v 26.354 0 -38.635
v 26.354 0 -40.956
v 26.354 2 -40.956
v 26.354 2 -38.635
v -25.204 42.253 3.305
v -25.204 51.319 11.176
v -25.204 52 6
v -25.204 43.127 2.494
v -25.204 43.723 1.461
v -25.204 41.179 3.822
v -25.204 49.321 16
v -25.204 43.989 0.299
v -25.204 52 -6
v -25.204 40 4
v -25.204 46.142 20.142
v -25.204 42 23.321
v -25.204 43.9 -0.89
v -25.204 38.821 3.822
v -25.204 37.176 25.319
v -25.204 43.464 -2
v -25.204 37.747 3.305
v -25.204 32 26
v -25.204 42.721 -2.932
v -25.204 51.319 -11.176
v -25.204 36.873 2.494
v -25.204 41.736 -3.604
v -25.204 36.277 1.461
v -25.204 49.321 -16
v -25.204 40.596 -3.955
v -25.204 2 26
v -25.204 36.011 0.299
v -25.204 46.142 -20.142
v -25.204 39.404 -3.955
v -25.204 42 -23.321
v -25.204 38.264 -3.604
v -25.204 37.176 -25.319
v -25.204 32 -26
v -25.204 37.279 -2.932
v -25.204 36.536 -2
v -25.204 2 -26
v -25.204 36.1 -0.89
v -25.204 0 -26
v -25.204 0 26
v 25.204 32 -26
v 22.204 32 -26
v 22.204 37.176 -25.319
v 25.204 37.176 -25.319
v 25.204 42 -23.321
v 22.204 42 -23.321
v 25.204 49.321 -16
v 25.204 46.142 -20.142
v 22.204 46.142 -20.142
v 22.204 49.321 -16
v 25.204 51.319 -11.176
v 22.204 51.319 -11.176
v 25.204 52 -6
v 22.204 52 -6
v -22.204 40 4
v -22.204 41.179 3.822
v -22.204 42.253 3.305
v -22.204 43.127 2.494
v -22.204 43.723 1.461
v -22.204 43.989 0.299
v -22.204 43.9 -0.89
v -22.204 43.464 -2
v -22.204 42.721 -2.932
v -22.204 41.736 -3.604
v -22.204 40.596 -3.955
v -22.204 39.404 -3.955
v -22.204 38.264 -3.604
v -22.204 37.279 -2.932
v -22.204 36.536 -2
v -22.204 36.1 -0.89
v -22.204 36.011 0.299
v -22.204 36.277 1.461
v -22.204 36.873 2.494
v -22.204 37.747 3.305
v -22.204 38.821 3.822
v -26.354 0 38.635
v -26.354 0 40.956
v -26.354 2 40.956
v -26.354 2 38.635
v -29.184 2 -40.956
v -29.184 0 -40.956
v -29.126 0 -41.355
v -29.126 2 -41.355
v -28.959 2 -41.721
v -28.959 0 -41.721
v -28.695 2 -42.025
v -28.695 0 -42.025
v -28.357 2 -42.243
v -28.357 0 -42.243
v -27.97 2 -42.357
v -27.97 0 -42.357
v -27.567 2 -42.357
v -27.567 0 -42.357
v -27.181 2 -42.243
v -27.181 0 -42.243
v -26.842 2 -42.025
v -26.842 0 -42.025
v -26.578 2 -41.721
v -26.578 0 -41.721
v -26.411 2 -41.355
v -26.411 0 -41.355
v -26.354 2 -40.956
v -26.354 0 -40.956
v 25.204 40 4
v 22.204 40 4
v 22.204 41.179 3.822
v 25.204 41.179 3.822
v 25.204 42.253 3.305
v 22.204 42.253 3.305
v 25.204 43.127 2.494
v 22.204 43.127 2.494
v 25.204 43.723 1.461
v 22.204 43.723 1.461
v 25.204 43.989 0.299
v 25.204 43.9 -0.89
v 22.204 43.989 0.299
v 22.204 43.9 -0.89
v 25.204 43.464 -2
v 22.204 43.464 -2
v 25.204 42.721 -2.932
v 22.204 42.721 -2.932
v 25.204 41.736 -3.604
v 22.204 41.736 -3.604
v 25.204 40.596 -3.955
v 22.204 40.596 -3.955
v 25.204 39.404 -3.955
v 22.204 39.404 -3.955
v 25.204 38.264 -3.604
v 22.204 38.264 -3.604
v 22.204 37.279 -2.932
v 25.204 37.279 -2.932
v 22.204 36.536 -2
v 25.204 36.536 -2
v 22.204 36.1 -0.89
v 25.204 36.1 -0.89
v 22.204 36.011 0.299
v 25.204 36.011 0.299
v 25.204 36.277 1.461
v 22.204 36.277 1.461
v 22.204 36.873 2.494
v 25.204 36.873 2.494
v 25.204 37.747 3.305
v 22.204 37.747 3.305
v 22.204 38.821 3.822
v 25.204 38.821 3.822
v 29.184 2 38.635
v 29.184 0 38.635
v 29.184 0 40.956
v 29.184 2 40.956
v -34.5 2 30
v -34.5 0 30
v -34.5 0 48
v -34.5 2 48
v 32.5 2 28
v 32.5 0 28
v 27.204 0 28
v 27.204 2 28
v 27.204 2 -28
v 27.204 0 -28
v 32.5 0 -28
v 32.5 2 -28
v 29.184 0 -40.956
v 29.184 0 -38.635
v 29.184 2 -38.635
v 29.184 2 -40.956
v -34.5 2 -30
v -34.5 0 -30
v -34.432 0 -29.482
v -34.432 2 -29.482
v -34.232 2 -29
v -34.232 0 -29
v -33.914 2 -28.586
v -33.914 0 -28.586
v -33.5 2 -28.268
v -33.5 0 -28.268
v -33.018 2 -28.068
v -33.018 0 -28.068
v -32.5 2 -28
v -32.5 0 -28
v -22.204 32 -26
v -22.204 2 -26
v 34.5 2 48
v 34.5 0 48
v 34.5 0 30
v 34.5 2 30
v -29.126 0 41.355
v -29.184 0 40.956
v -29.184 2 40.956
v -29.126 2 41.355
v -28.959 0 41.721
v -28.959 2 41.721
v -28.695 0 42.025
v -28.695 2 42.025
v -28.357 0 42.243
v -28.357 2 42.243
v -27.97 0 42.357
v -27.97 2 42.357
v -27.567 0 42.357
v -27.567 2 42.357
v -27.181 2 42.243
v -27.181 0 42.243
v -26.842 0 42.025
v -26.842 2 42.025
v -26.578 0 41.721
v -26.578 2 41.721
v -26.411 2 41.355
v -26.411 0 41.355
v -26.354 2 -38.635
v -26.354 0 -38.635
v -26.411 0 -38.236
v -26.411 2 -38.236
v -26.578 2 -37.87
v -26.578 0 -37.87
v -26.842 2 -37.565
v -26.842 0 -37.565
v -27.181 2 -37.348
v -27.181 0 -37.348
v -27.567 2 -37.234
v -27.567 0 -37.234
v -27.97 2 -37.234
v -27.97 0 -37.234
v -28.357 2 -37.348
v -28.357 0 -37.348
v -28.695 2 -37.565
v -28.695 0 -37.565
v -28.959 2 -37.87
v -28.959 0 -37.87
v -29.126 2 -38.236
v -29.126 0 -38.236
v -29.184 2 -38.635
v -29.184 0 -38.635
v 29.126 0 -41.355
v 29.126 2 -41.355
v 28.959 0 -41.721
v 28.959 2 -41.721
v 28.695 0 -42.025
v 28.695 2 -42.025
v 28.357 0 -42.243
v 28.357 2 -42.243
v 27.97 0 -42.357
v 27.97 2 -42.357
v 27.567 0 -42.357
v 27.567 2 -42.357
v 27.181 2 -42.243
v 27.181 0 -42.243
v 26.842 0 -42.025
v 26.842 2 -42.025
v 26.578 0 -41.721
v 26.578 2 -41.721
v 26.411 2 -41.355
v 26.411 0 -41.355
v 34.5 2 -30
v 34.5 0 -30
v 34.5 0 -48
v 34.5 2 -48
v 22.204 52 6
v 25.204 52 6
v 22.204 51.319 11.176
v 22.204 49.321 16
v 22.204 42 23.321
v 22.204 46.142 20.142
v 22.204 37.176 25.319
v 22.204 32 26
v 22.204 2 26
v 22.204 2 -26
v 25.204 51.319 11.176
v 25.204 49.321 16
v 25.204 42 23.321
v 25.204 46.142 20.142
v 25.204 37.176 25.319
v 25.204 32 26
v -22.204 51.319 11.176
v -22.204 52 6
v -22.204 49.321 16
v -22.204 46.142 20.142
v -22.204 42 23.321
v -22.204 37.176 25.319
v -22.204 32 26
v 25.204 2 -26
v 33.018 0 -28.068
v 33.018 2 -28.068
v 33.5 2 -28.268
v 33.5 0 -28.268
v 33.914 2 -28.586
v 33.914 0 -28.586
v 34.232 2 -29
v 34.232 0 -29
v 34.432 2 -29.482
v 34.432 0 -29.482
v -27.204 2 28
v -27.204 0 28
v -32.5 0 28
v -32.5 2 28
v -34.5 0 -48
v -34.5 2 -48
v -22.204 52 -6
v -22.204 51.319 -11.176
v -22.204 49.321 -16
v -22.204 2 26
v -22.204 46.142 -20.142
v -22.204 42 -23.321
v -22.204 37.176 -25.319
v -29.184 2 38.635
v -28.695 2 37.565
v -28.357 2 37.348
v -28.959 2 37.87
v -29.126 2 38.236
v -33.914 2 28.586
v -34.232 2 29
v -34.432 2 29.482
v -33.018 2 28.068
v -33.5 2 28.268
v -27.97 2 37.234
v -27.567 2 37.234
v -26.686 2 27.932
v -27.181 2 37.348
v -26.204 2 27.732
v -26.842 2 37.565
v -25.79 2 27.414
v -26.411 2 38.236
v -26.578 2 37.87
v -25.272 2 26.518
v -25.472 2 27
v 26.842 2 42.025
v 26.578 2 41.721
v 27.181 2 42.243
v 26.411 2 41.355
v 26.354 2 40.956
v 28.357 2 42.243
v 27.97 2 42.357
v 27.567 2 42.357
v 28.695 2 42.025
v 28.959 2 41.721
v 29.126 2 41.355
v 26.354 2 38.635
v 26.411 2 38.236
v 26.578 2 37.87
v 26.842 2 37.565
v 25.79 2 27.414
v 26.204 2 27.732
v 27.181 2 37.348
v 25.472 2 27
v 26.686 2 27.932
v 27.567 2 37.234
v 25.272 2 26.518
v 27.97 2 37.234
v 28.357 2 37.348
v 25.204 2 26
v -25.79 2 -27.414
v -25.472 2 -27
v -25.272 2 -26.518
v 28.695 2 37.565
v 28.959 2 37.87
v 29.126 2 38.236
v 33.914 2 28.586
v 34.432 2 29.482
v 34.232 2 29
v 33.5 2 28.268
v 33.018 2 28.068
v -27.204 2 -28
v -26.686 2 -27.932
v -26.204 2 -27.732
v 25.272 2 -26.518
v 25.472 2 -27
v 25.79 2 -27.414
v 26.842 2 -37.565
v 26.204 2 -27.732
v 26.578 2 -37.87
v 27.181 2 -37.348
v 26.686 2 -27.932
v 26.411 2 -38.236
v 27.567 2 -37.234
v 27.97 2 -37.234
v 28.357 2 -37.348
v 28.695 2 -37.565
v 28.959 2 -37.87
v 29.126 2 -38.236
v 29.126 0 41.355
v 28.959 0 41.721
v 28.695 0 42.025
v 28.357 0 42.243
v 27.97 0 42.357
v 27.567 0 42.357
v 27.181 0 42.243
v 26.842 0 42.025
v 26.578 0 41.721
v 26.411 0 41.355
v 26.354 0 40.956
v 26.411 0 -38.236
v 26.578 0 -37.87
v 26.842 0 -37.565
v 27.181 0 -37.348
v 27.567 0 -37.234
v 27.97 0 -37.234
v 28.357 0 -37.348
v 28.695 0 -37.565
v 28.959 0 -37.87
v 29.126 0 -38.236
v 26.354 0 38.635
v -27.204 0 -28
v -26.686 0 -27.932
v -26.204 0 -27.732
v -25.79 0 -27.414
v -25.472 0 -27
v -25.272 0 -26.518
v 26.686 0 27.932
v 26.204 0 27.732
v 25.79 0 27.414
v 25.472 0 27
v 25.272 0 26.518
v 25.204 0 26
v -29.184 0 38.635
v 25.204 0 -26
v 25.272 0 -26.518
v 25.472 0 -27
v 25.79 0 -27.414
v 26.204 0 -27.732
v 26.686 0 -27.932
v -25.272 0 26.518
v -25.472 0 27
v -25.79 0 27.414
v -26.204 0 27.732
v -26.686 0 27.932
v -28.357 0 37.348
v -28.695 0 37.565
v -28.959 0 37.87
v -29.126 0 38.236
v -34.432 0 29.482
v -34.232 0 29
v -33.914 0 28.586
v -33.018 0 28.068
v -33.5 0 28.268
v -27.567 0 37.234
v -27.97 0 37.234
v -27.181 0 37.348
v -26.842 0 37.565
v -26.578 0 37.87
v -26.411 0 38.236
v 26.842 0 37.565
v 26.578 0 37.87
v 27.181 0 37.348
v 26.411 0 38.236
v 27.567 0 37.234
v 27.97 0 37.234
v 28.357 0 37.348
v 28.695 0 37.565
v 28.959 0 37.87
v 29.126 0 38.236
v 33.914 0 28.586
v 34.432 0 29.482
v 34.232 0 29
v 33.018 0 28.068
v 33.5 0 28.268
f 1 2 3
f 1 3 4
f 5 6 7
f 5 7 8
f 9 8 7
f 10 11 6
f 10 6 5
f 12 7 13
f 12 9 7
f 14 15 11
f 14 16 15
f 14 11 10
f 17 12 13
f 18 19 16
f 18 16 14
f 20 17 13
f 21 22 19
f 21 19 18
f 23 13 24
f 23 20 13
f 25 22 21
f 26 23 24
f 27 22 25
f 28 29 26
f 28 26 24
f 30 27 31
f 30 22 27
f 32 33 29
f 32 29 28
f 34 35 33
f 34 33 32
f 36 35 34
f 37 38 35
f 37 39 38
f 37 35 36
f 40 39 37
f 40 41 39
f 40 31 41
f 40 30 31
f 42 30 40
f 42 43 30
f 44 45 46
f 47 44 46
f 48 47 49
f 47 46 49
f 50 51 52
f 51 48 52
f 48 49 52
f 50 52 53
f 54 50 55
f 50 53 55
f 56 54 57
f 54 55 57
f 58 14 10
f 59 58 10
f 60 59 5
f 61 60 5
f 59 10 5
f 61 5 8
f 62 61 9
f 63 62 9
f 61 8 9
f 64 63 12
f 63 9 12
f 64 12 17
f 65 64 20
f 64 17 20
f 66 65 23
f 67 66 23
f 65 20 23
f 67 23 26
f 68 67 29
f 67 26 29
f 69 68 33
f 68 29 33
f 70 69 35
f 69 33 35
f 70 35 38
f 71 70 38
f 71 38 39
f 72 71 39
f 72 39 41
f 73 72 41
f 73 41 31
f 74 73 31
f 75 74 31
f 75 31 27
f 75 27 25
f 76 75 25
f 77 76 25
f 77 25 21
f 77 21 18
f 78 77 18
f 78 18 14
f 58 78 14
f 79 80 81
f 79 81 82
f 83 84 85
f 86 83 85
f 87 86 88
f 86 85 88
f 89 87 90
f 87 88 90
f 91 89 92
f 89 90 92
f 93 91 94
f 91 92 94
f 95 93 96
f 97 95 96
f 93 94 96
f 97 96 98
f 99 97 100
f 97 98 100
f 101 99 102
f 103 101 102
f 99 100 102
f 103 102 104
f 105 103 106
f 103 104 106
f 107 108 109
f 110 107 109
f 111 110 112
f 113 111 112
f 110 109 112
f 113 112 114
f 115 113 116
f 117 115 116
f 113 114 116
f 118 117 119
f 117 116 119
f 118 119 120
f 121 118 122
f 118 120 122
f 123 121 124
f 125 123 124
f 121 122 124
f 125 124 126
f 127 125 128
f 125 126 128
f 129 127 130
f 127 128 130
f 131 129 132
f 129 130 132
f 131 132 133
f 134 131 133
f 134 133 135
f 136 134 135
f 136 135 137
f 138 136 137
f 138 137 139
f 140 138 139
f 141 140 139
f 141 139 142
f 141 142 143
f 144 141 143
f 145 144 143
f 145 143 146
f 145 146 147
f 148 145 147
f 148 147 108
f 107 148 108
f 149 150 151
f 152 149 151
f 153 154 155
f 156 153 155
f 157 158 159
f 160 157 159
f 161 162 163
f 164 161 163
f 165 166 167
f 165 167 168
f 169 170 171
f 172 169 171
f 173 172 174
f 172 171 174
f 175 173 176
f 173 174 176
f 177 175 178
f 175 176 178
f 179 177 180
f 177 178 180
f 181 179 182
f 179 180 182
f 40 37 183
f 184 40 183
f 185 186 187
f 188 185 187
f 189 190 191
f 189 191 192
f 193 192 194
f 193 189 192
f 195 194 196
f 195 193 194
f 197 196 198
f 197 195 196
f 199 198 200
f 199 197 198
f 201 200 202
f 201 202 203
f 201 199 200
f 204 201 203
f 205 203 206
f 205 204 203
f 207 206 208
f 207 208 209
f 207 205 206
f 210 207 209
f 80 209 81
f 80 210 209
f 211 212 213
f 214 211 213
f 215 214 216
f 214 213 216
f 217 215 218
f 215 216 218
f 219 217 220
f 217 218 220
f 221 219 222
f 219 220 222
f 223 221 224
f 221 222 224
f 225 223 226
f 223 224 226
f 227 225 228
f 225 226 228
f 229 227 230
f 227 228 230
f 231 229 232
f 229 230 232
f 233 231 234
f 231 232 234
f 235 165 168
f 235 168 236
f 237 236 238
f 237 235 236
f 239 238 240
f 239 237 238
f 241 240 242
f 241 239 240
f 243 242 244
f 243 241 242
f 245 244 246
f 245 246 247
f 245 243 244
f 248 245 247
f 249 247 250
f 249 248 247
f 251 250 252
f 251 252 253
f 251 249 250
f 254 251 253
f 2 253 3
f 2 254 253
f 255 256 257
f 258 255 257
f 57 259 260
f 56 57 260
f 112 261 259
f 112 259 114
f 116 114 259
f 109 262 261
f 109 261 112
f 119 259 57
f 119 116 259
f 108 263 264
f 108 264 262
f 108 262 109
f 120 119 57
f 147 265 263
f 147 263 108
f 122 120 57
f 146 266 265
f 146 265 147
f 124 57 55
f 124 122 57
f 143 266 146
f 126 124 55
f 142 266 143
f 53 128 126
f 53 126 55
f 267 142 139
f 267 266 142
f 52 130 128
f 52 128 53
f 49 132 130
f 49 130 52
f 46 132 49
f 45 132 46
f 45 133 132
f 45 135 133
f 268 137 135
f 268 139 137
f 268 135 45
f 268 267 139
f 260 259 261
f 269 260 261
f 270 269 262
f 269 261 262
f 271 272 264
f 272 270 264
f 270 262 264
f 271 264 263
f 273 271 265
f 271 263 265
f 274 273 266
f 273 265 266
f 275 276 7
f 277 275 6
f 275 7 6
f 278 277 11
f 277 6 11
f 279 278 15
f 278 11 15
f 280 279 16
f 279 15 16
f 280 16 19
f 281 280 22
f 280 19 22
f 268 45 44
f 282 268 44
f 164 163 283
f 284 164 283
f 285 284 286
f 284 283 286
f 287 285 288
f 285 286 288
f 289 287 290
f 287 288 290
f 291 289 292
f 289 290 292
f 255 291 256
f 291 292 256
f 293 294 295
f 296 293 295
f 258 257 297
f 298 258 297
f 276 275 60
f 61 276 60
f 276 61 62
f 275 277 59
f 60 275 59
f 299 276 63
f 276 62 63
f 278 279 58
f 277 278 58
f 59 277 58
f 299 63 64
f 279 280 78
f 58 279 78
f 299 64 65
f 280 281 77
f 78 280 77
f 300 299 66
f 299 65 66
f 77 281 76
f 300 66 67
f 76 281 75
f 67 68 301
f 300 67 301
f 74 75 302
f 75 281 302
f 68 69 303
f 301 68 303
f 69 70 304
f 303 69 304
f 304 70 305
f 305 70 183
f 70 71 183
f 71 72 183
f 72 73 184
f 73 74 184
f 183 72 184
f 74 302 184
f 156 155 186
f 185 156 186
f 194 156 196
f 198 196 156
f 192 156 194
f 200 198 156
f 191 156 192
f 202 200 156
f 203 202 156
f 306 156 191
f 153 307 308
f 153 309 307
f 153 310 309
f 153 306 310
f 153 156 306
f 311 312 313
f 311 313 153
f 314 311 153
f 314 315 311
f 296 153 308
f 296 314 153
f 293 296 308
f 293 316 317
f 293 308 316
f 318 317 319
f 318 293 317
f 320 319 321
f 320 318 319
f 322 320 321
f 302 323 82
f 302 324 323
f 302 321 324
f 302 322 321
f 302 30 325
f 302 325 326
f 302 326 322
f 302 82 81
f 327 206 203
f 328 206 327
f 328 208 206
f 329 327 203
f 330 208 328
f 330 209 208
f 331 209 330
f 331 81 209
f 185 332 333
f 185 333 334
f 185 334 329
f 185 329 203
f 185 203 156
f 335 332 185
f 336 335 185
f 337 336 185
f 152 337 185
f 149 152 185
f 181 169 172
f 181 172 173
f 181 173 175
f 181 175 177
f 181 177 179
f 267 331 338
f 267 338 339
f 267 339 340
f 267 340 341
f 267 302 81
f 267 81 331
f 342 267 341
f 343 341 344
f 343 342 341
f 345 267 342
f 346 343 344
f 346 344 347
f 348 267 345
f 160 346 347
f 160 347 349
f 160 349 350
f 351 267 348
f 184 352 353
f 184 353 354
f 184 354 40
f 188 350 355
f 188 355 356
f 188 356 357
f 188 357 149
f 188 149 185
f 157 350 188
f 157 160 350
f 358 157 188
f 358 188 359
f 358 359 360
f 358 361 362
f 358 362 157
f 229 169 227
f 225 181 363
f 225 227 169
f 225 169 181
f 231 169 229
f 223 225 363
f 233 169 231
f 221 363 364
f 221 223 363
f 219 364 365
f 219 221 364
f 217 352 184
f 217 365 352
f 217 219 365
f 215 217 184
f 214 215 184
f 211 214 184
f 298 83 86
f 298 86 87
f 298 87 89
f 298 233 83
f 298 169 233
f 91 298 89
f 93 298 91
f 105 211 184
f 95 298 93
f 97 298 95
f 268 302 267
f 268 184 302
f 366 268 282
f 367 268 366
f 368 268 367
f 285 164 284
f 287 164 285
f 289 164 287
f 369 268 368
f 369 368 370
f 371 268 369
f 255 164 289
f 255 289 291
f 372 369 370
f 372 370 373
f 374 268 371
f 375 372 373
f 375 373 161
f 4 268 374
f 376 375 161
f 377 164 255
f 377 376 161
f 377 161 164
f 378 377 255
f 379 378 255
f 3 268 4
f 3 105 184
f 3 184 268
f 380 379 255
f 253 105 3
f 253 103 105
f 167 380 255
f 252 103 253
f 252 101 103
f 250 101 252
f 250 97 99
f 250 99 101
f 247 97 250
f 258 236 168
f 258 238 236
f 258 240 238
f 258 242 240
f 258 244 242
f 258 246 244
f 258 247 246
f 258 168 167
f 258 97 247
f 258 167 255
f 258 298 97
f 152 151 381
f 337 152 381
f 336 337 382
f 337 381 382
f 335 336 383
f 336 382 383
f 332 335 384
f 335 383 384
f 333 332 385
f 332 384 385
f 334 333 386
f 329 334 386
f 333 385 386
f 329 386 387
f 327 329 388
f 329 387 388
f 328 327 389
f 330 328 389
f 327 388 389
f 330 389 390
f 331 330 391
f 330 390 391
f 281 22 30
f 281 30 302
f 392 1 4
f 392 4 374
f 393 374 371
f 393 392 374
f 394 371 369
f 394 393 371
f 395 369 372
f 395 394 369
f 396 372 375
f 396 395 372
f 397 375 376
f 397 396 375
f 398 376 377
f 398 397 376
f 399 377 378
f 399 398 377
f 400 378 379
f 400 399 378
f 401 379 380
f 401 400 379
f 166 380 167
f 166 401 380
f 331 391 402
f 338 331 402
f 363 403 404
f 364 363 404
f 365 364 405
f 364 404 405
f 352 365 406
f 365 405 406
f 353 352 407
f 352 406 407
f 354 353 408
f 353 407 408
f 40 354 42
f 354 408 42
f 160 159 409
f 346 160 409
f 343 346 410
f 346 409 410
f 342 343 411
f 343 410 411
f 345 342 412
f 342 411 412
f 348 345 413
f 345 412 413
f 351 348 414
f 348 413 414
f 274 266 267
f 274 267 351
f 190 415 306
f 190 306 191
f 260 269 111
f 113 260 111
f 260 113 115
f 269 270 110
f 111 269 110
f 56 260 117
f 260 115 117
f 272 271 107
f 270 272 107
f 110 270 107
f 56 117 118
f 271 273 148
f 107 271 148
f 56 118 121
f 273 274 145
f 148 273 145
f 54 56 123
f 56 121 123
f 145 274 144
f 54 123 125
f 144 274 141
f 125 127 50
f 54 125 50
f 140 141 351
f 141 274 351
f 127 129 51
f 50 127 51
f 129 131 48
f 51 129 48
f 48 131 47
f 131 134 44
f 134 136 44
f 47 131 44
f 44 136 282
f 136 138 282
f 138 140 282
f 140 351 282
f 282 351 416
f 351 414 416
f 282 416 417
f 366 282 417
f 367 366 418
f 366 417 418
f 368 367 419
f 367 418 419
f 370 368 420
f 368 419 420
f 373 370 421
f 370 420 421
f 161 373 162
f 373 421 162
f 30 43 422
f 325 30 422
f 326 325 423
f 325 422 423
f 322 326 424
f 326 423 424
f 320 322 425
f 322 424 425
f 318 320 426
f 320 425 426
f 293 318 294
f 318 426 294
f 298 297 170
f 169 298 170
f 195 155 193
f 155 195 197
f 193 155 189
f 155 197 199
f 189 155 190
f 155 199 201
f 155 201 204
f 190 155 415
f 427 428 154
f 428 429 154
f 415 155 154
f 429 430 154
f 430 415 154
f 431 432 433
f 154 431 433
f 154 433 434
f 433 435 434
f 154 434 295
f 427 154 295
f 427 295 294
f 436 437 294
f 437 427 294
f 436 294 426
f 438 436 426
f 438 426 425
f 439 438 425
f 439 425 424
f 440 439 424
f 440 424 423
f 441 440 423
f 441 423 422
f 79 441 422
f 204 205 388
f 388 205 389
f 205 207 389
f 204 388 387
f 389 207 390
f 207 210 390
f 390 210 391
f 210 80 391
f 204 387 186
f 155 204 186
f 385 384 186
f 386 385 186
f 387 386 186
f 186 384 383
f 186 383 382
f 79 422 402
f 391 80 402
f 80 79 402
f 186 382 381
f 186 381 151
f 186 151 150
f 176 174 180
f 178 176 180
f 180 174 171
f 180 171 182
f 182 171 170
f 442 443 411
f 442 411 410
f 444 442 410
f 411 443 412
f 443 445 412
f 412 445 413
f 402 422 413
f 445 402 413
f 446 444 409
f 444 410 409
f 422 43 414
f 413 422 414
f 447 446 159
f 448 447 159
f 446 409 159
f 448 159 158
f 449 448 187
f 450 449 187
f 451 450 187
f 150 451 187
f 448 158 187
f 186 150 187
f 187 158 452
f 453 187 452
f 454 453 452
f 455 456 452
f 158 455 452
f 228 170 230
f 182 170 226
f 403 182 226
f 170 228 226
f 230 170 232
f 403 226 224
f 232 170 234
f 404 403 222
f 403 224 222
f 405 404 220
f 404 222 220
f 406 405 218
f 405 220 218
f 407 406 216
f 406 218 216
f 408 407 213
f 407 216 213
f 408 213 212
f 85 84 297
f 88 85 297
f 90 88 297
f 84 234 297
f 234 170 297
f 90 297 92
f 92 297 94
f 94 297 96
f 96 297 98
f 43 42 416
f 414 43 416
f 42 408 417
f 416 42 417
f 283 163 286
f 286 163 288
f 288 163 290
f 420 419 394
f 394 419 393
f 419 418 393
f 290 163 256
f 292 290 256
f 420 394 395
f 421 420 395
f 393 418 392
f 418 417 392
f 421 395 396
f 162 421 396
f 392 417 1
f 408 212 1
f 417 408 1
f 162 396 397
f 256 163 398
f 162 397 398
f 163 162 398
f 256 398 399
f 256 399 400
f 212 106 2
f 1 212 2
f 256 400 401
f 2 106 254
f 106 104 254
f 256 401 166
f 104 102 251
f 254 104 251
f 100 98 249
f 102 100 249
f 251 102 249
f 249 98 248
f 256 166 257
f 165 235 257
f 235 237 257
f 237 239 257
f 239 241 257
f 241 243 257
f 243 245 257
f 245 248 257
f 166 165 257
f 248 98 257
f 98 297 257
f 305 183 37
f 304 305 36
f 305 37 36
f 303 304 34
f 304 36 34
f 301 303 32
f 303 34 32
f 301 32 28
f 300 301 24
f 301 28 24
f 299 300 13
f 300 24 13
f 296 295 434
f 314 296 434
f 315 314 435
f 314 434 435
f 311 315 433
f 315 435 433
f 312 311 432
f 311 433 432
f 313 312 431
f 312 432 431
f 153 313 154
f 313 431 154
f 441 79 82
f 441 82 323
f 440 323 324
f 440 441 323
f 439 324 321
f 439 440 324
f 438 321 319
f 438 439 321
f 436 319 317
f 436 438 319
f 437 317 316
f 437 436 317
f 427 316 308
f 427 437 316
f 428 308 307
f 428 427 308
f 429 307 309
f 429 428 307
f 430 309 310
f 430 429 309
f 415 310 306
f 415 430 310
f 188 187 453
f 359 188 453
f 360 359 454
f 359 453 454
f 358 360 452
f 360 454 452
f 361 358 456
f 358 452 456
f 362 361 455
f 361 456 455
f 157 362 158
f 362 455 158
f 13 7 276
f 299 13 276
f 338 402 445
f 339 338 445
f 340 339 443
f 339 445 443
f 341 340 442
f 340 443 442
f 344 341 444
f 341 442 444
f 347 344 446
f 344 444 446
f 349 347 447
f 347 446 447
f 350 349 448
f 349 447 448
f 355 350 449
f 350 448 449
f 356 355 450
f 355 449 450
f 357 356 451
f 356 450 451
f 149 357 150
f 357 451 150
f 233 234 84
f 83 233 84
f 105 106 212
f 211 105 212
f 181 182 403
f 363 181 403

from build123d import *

# Parameters (mm, degrees)
BOSS_EXTRUDE1_DEPTH = 2
SKETCH2_W           = 3
SKETCH2_H           = 52
BOSS_EXTRUDE2_DEPTH = 50
SKETCH3_R           = 4
CUT_EXTRUDE1_DEPTH  = 90


with BuildPart() as part:
    # Sketch1 → Boss-Extrude1 (new body)
    with BuildSketch(Plane(origin=(0, 0, 0), x_dir=(1, 0, 0), z_dir=(0, 1, 0))):
        with BuildLine():
            Line((-32.5, 28), (-27.204017471, 28))
            ThreePointArc((-27.204017471, 28), (-25.789803909, 27.414213562), (-25.204017471, 26))
            Line((-25.204017471, 26), (-25.204017471, -26))
            ThreePointArc((-25.204017471, -26), (-25.789803909, -27.414213562), (-27.204017471, -28))
            Line((-27.204017471, -28), (-32.5, -28))
            ThreePointArc((-32.5, -28), (-33.914213562, -28.585786438), (-34.5, -30))
            Line((-34.5, -30), (-34.5, -48))
            Line((-34.5, -48), (34.5, -48))
            Line((34.5, -48), (34.5, -30))
            ThreePointArc((34.5, -30), (33.914213562, -28.585786438), (32.5, -28))
            Line((32.5, -28), (27.204017471, -28))
            ThreePointArc((27.204017471, -28), (25.789803909, -27.414213562), (25.204017471, -26))
            Line((25.204017471, -26), (25.204017471, 26))
            ThreePointArc((25.204017471, 26), (25.789803909, 27.414213562), (27.204017471, 28))
            Line((27.204017471, 28), (32.5, 28))
            ThreePointArc((32.5, 28), (33.914213562, 28.585786438), (34.5, 30))
            Line((34.5, 30), (34.5, 48))
            Line((34.5, 48), (-34.5, 48))
            Line((-34.5, 48), (-34.5, 30))
            ThreePointArc((-34.5, 30), (-33.914213562, 28.585786438), (-32.5, 28))
        make_face()
        with BuildLine():
            Line((-26.353730012, 40.955917197), (-26.353730012, 38.634748977))
            ThreePointArc((-26.353730012, 38.634748977), (-27.768725827, 37.219753162), (-29.183721642, 38.634748977))
            Line((-29.183721642, 38.634748977), (-29.183721642, 40.955917197))
            ThreePointArc((-29.183721642, 40.955917197), (-27.768725827, 42.370913012), (-26.353730012, 40.955917197))
        make_face(mode=Mode.SUBTRACT)
        with BuildLine():
            Line((26.353730012, 40.955917197), (26.353730012, 38.634748977))
            ThreePointArc((26.353730012, 38.634748977), (27.768725827, 37.219753162), (29.183721642, 38.634748977))
            Line((29.183721642, 38.634748977), (29.183721642, 40.955917197))
            ThreePointArc((29.183721642, 40.955917197), (27.768725827, 42.370913012), (26.353730012, 40.955917197))
        make_face(mode=Mode.SUBTRACT)
        with BuildLine():
            Line((-26.353730012, -40.955917197), (-26.353730012, -38.634748977))
            ThreePointArc((-26.353730012, -38.634748977), (-27.768725827, -37.219753162), (-29.183721642, -38.634748977))
            Line((-29.183721642, -38.634748977), (-29.183721642, -40.955917197))
            ThreePointArc((-29.183721642, -40.955917197), (-27.768725827, -42.370913012), (-26.353730012, -40.955917197))
        make_face(mode=Mode.SUBTRACT)
        with BuildLine():
            Line((26.353730012, -40.955917197), (26.353730012, -38.634748977))
            ThreePointArc((26.353730012, -38.634748977), (27.768725827, -37.219753162), (29.183721642, -38.634748977))
            Line((29.183721642, -38.634748977), (29.183721642, -40.955917197))
            ThreePointArc((29.183721642, -40.955917197), (27.768725827, -42.370913012), (26.353730012, -40.955917197))
        make_face(mode=Mode.SUBTRACT)
    extrude(amount=BOSS_EXTRUDE1_DEPTH)

    # Sketch2 → Boss-Extrude2 (add)
    with BuildSketch(Plane(origin=(0, 2, 0), x_dir=(1, 0, 0), z_dir=(0, 1, 0))):
        with Locations((-23.704017471, 0)):
            Rectangle(SKETCH2_W, SKETCH2_H)
        with Locations((23.704017471, 0)):
            Rectangle(SKETCH2_W, SKETCH2_H)
    extrude(amount=BOSS_EXTRUDE2_DEPTH)

    # Sketch3 → Cut-Extrude1 (cut)
    with BuildSketch(Plane.ZY.offset(25.204017471)):
        with BuildLine():
            Line((-26, 52), (-26, 32))
            ThreePointArc((-26, 32), (-20.142135624, 46.142135624), (-6, 52))
            Line((-6, 52), (-26, 52))
        make_face()
        with BuildLine():
            ThreePointArc((6, 52), (20.142135624, 46.142135624), (26, 32))
            Line((26, 32), (26, 52))
            Line((26, 52), (6, 52))
        make_face()
        with Locations((0, 40)):
            Circle(SKETCH3_R)
    extrude(amount=-CUT_EXTRUDE1_DEPTH, mode=Mode.SUBTRACT)


solid = part.part
